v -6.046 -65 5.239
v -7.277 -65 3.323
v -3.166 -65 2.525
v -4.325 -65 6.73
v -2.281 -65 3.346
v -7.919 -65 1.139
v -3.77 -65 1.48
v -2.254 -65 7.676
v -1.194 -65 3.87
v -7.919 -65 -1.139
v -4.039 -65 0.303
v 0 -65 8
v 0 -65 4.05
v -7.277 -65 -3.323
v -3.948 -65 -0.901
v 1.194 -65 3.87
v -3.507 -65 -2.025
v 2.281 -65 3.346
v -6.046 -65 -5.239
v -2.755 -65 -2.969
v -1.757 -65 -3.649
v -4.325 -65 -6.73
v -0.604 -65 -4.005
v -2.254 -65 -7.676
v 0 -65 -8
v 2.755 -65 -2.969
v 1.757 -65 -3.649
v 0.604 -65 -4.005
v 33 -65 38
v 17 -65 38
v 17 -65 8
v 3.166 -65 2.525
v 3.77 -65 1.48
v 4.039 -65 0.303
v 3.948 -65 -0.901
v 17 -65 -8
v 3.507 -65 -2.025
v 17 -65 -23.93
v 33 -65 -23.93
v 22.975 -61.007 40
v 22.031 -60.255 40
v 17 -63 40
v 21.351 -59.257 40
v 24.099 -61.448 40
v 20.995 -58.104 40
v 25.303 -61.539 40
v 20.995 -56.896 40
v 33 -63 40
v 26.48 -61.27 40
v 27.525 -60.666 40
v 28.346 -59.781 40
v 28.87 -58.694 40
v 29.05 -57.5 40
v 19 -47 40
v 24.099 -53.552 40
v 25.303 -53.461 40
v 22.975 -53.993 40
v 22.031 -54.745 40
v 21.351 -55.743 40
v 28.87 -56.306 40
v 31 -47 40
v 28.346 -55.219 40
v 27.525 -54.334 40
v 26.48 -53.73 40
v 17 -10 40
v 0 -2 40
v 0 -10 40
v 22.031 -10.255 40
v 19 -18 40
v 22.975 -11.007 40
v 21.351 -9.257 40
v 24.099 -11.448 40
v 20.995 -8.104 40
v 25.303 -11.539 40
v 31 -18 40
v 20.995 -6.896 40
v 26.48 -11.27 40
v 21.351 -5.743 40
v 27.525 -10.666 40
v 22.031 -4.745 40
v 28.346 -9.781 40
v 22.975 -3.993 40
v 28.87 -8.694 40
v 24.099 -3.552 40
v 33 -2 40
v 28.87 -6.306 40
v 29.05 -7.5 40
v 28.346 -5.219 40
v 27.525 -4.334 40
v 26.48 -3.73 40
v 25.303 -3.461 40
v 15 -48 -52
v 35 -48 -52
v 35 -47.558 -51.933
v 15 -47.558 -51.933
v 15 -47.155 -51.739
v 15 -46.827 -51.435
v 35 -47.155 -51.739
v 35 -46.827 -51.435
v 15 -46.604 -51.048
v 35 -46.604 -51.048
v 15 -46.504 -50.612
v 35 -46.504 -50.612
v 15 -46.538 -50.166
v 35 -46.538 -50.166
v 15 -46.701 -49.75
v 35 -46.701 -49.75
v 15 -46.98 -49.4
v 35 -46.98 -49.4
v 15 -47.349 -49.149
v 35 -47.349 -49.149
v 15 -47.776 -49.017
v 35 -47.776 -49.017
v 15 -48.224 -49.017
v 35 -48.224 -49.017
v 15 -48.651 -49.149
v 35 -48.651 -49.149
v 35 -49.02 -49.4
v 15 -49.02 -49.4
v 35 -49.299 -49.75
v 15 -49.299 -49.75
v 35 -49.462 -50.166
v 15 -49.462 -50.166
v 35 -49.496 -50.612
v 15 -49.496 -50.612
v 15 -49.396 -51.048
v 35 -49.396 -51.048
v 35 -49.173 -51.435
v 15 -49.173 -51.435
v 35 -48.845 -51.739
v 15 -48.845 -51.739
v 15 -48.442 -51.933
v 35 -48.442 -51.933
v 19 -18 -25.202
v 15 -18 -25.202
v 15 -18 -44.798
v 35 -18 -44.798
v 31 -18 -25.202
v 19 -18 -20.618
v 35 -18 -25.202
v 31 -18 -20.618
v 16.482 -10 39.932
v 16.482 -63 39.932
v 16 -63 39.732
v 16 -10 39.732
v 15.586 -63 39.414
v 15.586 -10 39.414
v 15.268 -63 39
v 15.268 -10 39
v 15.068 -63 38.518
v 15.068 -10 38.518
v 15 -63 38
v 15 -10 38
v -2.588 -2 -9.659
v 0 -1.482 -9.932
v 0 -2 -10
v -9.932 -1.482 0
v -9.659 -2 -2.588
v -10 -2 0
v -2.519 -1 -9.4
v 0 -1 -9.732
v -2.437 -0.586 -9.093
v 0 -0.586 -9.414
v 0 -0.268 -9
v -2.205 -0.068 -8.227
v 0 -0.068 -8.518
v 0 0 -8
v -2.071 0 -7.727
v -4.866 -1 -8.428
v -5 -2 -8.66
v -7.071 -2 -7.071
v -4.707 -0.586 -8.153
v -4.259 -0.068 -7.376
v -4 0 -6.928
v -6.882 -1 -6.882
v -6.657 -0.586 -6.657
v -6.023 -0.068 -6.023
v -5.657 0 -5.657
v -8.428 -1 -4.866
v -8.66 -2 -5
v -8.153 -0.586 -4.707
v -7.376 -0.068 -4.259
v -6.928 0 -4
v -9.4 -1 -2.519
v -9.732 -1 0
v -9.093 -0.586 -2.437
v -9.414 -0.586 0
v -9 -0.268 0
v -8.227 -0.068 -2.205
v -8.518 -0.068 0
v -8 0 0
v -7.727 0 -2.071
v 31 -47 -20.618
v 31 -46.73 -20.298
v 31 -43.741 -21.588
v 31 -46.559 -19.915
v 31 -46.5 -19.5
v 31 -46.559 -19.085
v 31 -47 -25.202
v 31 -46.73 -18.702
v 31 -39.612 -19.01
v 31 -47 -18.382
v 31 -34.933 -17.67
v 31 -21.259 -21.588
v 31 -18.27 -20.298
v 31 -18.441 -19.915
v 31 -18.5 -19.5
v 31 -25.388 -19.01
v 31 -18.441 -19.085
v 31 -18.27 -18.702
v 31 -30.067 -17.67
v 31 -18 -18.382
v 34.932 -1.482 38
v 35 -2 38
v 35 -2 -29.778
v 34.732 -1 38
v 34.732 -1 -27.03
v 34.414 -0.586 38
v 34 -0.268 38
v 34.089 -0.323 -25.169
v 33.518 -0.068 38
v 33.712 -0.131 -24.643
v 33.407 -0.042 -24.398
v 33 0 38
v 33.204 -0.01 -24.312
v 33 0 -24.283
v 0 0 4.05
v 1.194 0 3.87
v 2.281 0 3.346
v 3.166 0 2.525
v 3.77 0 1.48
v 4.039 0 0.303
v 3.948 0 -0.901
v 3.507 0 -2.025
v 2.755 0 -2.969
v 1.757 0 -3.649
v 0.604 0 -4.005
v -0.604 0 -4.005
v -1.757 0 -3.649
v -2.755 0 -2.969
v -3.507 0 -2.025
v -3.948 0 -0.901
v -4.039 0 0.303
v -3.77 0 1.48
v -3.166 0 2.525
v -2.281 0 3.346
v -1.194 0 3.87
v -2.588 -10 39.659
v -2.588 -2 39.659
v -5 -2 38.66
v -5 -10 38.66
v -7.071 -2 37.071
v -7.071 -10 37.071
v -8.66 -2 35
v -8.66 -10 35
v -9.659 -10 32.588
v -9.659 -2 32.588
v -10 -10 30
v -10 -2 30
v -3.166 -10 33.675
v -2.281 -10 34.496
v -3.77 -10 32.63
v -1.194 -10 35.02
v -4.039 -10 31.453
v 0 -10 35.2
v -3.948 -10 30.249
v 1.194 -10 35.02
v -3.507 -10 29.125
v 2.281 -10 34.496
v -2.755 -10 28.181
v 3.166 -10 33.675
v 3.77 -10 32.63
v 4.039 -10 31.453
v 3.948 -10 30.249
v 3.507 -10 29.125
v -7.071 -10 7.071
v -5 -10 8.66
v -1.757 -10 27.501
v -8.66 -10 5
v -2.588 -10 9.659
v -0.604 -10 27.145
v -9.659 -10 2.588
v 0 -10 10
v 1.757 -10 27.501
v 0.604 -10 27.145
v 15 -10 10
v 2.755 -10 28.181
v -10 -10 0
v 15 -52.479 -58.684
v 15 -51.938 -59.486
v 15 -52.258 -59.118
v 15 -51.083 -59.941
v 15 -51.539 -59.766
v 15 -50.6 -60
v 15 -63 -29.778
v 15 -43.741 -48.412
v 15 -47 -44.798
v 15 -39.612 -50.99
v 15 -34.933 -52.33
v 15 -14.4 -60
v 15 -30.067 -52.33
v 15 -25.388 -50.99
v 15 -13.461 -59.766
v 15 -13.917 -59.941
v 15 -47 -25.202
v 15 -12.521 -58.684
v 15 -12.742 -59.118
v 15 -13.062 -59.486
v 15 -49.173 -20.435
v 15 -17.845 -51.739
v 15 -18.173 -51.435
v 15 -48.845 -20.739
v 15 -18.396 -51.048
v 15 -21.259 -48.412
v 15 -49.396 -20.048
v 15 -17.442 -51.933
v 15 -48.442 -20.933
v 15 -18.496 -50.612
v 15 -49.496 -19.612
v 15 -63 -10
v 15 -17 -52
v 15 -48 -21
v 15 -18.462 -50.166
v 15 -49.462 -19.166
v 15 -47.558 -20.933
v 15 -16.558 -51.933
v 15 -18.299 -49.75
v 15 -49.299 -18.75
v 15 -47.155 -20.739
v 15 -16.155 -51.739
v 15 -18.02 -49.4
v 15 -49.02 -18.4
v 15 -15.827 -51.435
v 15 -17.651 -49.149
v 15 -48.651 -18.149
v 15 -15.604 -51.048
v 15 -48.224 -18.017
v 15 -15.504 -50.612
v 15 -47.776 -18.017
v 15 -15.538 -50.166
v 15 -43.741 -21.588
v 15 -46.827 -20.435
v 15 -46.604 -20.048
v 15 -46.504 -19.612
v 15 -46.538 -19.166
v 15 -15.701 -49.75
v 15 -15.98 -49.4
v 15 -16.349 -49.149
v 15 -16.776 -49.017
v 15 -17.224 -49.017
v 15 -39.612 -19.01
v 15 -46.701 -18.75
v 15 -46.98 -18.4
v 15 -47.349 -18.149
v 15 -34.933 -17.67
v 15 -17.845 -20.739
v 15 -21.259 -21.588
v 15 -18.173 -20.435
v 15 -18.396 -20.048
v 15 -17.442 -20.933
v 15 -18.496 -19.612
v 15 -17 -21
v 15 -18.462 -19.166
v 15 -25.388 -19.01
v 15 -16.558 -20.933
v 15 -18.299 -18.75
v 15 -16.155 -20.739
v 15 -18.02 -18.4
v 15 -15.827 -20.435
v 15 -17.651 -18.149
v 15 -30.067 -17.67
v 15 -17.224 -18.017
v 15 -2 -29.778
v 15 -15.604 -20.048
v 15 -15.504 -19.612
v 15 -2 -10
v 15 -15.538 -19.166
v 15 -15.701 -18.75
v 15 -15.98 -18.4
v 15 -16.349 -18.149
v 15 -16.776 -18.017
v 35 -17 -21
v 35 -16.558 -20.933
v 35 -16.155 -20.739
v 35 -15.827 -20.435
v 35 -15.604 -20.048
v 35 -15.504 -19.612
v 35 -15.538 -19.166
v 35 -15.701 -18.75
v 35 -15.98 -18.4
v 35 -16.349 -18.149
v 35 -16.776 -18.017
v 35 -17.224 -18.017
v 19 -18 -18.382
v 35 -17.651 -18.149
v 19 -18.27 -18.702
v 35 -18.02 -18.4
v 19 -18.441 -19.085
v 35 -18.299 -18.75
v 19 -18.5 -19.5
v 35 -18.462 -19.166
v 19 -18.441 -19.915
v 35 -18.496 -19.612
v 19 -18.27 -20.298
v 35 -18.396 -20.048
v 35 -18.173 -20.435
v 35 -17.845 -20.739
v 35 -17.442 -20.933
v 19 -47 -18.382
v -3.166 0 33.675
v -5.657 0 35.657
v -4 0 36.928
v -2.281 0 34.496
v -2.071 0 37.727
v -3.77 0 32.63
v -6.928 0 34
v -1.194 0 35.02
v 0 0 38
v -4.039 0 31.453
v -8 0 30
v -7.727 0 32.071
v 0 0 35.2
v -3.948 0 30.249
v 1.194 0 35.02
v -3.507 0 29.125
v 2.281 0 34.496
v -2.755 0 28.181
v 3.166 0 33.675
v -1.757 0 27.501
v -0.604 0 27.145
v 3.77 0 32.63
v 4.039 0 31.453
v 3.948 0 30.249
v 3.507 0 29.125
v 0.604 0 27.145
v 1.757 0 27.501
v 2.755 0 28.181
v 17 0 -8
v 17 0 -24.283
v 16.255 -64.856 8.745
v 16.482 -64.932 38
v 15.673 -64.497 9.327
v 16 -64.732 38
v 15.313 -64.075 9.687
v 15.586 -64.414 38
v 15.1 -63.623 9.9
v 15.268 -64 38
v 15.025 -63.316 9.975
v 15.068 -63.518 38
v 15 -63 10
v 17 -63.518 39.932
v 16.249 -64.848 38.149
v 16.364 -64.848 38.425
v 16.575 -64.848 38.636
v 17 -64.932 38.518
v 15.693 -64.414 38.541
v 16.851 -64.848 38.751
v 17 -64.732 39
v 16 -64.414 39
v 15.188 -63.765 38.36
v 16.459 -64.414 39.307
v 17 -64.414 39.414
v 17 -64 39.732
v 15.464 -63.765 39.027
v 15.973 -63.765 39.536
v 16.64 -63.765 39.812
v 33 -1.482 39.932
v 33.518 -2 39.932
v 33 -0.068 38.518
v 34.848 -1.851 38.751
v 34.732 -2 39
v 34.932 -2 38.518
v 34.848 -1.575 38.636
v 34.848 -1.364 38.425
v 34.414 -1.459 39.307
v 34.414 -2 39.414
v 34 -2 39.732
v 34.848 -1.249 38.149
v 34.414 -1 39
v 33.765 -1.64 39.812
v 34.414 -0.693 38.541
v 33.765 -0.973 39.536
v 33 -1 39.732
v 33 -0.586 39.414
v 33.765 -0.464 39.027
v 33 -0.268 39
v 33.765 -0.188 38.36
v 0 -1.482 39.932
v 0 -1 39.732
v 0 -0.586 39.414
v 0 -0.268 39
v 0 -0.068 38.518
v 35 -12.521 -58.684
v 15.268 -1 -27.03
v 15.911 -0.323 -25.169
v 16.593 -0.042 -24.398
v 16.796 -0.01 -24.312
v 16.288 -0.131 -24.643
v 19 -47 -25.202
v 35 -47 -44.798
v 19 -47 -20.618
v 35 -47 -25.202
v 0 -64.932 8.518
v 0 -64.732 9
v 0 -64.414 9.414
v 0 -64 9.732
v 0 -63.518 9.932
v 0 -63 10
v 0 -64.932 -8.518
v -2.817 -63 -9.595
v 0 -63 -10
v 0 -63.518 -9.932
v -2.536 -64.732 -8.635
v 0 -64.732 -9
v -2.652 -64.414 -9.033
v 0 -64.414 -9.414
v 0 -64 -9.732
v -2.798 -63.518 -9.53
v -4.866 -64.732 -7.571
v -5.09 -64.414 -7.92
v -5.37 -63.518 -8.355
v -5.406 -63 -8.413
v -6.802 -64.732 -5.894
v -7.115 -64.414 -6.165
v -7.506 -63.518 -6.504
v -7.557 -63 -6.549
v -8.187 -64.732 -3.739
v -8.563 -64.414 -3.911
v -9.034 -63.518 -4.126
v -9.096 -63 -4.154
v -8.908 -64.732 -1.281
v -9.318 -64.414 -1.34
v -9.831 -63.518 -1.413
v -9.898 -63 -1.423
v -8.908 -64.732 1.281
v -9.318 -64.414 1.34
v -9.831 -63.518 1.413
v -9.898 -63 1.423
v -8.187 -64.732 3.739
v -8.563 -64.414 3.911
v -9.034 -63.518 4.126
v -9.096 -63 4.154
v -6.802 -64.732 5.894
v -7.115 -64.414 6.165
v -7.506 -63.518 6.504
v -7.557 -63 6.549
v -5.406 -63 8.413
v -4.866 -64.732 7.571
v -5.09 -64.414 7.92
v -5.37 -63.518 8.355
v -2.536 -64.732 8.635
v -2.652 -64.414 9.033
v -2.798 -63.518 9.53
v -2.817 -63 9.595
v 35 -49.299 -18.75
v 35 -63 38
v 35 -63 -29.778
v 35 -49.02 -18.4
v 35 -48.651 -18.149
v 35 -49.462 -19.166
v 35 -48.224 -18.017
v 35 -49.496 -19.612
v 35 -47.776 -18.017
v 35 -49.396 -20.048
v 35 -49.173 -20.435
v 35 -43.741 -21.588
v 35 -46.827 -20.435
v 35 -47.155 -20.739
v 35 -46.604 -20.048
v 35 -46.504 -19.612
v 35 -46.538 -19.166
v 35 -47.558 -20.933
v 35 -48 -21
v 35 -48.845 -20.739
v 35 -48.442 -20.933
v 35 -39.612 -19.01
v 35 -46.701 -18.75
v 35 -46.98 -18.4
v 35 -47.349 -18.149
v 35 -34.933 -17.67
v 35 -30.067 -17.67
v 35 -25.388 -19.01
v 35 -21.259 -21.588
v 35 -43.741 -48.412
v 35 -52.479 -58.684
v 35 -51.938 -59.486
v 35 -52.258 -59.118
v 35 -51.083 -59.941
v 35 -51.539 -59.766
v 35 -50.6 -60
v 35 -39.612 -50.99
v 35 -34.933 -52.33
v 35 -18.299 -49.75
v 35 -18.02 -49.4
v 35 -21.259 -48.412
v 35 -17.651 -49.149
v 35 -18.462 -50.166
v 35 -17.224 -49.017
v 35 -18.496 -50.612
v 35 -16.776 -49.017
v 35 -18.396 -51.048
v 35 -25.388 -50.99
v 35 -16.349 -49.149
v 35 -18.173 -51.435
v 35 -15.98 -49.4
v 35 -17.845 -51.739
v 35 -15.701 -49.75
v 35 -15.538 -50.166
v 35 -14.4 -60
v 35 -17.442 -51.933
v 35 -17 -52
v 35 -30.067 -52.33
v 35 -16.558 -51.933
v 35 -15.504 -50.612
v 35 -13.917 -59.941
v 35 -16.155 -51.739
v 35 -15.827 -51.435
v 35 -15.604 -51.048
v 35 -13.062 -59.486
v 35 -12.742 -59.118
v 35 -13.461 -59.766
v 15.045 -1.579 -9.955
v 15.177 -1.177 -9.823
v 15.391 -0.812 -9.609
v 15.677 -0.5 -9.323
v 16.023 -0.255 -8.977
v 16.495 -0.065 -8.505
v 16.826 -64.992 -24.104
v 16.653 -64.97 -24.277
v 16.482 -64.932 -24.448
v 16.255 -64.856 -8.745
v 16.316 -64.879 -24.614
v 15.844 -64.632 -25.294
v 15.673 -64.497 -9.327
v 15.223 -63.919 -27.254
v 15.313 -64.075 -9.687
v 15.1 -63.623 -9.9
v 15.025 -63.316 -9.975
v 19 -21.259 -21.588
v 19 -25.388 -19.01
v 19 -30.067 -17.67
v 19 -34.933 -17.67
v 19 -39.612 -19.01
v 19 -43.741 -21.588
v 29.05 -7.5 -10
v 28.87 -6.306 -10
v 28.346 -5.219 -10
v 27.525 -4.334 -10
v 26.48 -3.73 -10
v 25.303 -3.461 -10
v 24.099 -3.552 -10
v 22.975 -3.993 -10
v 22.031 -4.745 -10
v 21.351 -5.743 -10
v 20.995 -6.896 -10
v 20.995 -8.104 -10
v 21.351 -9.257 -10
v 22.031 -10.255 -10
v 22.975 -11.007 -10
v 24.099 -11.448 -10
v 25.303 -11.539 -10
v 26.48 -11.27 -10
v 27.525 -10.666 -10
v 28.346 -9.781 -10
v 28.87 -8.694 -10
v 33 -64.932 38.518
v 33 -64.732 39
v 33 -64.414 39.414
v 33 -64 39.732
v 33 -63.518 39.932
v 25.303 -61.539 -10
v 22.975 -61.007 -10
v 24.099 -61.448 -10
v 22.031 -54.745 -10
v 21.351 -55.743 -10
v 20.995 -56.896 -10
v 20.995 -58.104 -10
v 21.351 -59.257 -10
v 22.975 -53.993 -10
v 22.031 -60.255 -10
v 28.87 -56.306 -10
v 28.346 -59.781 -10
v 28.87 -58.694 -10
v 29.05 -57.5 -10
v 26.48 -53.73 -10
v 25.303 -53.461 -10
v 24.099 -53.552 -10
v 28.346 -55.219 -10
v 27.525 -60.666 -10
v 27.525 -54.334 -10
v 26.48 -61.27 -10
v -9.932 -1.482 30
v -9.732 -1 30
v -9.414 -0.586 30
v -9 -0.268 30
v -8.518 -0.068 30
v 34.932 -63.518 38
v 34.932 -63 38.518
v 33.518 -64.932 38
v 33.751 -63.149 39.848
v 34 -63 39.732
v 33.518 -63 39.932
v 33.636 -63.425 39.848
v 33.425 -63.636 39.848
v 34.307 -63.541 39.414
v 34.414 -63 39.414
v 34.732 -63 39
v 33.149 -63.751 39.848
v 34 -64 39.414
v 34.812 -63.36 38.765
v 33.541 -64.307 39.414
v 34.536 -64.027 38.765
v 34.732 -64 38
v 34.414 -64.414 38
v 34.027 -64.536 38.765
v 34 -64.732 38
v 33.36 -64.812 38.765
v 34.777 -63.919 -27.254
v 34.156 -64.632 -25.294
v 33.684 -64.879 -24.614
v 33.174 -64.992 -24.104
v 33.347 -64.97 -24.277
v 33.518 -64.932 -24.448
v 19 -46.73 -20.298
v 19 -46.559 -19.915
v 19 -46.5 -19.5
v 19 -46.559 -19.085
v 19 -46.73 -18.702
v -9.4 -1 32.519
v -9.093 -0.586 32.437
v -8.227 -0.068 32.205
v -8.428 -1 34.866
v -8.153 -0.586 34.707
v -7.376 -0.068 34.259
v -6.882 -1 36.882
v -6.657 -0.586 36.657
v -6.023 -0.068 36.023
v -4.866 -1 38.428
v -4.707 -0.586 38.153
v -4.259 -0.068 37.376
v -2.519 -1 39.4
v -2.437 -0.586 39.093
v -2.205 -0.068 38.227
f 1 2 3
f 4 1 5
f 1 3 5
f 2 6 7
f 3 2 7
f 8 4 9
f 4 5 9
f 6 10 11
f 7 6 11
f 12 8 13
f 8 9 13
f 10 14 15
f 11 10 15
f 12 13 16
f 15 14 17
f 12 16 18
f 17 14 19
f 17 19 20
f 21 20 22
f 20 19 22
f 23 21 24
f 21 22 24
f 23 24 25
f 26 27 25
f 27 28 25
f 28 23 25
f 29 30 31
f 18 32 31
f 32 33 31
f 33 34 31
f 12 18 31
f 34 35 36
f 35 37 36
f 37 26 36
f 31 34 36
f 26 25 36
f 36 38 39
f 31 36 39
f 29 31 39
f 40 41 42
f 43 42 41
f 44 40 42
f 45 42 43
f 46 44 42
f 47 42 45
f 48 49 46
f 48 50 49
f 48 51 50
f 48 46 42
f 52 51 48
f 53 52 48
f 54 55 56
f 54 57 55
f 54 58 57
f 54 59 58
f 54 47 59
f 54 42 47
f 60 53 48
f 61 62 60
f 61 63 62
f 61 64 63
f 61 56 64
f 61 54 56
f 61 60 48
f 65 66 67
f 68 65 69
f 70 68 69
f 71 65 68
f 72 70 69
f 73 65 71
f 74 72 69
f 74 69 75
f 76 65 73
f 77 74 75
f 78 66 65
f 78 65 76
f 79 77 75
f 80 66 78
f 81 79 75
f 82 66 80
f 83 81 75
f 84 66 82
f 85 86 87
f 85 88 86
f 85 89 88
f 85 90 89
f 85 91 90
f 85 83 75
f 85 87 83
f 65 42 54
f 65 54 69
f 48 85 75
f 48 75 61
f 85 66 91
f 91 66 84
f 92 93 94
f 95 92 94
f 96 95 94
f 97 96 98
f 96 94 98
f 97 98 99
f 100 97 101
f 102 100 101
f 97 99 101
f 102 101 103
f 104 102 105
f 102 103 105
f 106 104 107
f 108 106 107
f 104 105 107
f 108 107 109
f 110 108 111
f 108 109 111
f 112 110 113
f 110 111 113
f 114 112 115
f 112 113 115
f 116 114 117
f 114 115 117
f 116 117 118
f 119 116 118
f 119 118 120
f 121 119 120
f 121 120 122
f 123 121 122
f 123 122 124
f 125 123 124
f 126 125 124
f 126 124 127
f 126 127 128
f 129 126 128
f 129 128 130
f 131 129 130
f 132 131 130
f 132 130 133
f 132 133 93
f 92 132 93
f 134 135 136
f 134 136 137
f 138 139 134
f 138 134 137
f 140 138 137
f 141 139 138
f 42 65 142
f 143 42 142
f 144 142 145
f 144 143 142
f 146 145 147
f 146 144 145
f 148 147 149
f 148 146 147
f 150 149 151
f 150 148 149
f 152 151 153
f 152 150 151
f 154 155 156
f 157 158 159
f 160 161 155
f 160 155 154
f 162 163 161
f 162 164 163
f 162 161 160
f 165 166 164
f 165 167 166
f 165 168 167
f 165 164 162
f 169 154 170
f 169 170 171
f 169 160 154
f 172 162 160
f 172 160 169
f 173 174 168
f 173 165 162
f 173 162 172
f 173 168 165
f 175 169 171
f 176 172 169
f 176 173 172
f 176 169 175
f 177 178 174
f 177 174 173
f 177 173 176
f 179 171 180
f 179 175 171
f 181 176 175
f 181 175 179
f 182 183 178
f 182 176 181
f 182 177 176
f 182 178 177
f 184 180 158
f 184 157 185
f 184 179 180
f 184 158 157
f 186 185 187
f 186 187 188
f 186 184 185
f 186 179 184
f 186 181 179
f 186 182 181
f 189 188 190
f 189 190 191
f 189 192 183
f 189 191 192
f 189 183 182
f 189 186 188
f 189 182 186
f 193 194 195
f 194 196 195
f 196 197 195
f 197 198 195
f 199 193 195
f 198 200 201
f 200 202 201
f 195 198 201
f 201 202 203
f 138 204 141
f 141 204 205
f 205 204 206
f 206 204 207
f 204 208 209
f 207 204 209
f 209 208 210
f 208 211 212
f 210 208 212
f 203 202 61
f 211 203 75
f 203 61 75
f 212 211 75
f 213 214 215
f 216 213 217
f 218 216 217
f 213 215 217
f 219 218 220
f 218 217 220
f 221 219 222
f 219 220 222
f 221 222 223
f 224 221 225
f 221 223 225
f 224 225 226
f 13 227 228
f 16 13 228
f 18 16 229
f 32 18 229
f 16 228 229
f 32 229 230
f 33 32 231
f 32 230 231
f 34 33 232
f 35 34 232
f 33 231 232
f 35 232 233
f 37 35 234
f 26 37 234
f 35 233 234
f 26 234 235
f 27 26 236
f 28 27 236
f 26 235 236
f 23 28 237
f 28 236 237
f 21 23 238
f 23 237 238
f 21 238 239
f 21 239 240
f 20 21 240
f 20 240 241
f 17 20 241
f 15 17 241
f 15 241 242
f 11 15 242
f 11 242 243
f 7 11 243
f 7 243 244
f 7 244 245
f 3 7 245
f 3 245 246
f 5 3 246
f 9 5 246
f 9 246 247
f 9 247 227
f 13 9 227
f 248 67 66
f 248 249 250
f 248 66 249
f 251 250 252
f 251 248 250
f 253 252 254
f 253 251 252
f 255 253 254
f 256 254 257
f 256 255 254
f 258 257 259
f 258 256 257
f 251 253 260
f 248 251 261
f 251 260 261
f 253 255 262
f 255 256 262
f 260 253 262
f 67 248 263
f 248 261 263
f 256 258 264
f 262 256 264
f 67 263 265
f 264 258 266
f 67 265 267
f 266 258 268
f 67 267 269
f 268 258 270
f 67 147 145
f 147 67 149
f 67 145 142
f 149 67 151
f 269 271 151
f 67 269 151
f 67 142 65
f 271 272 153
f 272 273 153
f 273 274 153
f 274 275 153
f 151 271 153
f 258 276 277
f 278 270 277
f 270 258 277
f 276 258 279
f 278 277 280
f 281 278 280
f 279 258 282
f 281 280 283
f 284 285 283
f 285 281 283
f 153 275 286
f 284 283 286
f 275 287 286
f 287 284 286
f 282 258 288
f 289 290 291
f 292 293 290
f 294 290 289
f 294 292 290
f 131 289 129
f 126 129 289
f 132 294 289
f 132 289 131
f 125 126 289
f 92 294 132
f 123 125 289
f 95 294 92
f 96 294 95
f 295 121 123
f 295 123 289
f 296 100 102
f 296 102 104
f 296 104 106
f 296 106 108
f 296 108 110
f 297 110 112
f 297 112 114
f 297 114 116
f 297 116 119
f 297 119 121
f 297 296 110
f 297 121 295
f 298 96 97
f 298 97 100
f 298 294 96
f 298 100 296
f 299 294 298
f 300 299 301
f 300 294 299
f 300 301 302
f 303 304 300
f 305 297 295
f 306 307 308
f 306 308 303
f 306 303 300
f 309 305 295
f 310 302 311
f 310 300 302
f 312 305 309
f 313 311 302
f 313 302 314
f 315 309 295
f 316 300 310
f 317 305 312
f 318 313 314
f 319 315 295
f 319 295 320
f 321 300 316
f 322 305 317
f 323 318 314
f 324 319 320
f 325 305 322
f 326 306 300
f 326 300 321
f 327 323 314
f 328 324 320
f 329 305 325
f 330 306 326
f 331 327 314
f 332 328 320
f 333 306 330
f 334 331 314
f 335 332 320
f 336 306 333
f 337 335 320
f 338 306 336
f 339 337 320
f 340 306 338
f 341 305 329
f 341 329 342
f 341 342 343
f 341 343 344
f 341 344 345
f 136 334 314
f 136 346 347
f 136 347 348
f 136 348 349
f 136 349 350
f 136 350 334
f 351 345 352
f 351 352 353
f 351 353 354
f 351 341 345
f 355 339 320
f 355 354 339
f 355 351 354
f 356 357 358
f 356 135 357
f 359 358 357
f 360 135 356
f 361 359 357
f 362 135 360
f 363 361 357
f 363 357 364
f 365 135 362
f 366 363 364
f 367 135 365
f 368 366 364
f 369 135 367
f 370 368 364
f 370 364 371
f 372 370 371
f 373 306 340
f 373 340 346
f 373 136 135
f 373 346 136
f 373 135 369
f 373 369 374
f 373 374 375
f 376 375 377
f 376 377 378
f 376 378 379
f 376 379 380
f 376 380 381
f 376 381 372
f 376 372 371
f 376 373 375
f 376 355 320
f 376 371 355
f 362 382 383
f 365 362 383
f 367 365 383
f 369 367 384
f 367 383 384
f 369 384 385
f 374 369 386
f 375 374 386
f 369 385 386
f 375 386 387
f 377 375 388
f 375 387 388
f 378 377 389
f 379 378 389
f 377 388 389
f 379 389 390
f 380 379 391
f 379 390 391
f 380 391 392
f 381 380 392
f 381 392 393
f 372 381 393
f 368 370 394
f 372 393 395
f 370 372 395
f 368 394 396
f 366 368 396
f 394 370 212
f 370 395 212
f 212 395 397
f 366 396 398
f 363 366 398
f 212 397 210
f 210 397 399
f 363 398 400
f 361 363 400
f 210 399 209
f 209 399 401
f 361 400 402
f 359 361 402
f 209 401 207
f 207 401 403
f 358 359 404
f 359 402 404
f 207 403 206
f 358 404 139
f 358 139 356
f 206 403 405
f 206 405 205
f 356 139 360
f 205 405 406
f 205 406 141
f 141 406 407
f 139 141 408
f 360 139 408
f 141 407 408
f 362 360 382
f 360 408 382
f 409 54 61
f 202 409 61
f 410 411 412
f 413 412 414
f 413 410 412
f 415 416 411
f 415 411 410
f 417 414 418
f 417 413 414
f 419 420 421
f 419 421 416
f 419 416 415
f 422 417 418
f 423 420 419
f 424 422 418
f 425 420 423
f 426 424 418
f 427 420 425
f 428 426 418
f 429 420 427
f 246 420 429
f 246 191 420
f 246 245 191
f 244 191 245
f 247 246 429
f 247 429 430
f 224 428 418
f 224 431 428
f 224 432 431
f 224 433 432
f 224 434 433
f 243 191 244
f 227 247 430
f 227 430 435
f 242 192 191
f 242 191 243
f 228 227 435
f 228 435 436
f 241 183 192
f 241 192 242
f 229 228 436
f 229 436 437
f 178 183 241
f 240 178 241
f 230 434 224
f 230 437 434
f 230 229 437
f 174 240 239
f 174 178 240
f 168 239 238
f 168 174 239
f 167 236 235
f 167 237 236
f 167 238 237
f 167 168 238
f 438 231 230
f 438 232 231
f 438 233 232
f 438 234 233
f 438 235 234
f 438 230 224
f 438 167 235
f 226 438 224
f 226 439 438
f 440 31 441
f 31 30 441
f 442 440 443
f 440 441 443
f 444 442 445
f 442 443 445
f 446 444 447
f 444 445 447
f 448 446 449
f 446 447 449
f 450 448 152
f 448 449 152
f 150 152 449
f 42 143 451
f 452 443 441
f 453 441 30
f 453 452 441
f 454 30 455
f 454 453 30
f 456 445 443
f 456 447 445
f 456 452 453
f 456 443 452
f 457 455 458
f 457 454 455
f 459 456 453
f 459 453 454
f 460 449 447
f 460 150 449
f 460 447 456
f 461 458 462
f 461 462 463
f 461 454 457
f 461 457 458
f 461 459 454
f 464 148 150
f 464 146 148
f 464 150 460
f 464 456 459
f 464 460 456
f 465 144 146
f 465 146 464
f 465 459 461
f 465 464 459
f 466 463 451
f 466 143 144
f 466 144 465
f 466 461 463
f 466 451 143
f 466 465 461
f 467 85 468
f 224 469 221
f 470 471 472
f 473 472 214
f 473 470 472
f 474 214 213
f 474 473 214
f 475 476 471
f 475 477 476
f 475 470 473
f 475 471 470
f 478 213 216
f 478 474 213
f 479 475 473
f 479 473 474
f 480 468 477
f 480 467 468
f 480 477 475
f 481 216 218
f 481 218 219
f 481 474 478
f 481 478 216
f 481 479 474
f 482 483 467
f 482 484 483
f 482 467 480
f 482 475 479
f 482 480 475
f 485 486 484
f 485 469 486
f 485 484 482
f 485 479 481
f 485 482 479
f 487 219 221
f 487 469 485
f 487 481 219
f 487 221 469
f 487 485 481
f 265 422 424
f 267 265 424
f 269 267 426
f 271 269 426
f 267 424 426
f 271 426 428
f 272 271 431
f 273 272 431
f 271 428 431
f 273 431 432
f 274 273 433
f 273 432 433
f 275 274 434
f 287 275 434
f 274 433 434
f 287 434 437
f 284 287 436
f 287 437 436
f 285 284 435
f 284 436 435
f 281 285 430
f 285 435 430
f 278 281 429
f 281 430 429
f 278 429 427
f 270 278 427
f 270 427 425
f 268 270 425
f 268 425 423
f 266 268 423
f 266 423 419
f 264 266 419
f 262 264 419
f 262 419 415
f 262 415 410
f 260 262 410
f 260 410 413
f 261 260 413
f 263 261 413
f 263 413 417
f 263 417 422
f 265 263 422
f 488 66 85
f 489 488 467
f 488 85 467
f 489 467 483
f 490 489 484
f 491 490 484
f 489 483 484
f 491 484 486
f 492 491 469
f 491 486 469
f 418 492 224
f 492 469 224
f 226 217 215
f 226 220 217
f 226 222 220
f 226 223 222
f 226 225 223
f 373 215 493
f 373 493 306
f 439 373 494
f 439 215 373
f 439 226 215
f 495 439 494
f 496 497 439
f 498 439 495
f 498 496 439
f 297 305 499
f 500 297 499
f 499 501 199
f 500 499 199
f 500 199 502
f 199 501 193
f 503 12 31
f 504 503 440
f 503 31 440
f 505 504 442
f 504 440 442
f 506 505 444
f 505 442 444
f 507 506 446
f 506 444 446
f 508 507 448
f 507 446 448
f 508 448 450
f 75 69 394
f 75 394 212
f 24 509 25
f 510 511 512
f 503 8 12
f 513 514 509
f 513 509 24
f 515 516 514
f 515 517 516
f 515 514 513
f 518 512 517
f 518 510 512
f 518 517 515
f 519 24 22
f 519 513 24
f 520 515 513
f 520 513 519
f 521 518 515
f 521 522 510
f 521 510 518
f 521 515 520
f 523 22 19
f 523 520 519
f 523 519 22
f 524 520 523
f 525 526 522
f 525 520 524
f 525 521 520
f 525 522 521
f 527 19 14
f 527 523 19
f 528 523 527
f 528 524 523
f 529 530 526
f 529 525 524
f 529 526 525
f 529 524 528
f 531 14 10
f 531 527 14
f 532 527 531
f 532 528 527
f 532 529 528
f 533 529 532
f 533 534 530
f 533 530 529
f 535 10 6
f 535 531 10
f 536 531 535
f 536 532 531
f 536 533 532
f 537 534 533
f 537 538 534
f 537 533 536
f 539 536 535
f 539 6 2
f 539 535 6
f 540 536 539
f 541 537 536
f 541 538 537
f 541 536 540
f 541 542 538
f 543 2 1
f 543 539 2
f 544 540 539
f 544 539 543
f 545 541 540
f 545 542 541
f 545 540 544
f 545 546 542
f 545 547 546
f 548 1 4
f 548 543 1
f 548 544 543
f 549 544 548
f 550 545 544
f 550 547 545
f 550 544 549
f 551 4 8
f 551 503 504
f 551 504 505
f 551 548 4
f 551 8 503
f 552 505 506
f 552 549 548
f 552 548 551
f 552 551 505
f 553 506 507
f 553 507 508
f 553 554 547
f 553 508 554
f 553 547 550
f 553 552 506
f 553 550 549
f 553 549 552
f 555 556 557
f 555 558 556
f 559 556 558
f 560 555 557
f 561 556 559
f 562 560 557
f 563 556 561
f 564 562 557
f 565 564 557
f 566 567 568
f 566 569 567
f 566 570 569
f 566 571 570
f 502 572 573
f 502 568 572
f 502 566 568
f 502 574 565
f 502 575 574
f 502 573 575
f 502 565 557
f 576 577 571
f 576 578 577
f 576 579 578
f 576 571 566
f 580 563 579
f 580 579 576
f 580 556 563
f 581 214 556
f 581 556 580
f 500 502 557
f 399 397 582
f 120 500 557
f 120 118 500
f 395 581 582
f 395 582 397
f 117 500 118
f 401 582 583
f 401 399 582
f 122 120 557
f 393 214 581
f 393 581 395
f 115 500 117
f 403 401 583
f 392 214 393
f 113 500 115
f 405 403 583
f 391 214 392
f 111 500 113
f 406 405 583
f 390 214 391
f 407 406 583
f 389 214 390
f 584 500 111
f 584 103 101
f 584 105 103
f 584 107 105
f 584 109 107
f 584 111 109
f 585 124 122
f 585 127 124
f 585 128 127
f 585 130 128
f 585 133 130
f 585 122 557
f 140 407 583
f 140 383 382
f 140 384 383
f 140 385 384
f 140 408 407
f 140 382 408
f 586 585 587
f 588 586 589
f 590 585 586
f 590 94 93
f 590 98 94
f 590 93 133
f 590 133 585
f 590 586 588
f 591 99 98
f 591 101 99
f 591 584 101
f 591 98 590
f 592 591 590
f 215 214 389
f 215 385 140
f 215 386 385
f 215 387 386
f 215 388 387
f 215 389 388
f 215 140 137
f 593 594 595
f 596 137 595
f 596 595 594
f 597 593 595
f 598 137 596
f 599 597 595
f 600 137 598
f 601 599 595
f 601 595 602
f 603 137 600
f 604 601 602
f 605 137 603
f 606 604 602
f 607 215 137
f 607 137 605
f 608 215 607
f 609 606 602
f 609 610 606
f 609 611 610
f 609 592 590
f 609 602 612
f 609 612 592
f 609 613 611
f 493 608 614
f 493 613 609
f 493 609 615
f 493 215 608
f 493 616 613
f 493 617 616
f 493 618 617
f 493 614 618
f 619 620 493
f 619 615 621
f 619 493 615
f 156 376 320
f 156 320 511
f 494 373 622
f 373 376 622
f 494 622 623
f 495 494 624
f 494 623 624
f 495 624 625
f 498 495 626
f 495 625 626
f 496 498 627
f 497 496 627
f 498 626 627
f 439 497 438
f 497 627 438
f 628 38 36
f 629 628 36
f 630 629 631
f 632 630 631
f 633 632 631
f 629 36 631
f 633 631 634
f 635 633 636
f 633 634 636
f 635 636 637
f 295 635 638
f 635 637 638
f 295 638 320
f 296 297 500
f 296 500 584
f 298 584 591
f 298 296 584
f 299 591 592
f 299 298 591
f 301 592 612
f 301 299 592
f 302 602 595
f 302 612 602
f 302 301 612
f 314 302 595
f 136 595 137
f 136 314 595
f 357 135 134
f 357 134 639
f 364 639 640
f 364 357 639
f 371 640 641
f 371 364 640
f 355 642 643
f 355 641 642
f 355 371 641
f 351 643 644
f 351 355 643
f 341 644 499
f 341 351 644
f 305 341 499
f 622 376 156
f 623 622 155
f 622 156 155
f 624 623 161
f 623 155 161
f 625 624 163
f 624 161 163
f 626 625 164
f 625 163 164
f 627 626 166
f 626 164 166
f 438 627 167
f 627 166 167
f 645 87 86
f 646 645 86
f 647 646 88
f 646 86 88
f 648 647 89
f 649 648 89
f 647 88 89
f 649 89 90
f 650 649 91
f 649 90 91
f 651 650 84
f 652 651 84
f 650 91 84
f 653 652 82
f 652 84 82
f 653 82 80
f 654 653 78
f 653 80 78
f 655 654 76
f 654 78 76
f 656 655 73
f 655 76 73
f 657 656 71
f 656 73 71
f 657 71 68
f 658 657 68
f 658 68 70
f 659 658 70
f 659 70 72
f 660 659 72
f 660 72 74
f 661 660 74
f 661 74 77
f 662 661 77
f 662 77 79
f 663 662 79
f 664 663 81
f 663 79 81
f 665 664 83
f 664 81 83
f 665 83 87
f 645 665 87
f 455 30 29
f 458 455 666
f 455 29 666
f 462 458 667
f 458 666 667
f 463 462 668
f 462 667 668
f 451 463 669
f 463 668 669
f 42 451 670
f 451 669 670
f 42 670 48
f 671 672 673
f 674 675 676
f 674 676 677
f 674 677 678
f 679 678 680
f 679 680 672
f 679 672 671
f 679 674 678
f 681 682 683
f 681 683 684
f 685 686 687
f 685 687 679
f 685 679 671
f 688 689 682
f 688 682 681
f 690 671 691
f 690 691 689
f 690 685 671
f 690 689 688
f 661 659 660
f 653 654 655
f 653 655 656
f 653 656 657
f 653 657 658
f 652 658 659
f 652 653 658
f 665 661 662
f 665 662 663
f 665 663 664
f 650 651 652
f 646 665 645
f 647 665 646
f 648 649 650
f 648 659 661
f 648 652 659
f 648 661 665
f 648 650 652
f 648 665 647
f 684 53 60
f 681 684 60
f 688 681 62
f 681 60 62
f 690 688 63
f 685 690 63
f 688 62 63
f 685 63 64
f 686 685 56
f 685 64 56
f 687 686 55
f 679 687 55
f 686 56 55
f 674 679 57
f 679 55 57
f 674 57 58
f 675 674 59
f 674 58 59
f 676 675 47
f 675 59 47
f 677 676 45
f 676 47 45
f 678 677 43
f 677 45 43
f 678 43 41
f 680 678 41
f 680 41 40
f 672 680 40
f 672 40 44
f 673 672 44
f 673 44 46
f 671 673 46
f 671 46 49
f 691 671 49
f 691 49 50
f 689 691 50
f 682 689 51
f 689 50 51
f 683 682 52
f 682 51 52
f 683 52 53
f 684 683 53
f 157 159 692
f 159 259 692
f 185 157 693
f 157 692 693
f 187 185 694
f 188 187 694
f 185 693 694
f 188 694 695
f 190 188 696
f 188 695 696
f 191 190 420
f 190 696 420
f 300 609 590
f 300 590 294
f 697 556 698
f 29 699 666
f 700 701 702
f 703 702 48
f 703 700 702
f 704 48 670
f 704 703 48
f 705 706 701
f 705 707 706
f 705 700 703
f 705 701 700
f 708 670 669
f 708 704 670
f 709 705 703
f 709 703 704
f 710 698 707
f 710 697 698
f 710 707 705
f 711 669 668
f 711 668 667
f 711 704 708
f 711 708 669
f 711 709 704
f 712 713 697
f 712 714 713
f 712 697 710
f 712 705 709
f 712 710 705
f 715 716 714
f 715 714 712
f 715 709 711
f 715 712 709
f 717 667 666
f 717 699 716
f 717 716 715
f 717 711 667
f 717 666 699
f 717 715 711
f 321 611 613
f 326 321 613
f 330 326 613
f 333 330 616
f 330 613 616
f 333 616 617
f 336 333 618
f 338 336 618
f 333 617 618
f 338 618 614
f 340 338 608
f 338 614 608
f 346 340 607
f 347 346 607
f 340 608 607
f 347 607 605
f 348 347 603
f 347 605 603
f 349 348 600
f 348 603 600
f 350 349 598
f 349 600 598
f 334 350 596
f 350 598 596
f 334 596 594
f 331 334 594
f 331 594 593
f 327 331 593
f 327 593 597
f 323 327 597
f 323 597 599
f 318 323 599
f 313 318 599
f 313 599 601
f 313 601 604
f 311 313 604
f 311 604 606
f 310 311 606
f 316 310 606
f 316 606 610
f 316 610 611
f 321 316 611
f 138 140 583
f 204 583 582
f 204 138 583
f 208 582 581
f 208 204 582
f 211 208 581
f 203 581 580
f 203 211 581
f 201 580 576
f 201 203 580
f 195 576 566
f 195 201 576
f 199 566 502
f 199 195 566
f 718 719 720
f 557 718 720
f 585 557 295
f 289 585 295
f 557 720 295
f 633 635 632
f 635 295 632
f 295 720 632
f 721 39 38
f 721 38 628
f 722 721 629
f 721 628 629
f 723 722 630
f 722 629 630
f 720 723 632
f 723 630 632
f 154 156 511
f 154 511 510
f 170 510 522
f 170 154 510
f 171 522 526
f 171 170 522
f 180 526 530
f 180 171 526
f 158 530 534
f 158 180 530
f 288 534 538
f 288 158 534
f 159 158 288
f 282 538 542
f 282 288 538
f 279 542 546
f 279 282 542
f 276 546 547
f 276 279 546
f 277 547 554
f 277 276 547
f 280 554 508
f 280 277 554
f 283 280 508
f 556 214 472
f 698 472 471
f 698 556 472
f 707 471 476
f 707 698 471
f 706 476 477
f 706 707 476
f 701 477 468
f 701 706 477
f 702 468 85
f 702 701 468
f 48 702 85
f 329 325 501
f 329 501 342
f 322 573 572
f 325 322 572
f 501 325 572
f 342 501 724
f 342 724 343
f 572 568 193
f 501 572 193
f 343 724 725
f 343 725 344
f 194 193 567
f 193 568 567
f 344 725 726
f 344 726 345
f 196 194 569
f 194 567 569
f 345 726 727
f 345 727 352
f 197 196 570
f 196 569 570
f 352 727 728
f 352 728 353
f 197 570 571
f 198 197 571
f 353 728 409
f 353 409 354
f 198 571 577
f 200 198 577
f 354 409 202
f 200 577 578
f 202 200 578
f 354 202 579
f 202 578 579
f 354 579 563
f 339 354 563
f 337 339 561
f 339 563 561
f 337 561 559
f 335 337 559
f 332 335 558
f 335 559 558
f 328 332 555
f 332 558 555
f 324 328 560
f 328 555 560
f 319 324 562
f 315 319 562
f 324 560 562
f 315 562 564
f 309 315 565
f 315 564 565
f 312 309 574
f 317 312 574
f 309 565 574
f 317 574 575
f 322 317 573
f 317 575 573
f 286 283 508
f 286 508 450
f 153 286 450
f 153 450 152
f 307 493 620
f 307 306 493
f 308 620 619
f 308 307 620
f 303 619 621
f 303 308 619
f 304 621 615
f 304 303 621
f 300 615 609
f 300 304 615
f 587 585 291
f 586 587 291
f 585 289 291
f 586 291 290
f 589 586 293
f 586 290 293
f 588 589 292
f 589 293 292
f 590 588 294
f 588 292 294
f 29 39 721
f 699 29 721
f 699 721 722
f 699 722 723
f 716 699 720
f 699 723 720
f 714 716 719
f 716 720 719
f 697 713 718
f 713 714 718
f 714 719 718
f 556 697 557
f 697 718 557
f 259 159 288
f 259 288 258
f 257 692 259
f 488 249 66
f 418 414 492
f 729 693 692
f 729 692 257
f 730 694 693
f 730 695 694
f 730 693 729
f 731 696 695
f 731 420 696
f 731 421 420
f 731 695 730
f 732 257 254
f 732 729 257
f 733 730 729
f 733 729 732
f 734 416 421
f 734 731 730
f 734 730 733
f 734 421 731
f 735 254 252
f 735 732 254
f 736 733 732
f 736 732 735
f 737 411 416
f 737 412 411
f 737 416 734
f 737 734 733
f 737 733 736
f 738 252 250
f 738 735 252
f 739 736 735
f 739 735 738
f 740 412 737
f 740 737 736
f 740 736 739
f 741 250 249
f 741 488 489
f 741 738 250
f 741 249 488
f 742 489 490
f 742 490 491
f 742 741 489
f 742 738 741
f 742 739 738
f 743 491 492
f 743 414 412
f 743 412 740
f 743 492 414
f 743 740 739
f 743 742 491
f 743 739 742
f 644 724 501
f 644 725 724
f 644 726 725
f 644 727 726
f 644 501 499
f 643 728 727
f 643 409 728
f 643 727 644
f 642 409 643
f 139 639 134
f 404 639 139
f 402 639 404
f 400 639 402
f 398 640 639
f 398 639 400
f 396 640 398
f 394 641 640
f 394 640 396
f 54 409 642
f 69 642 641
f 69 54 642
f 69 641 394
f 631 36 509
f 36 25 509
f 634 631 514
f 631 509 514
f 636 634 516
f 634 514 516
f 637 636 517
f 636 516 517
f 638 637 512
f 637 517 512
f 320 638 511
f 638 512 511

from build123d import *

# Parameters (mm, degrees)
SKETCH2_R               = 10
BOSS_EXTRUDE1_DEPTH     = 65
BOSS_EXTRUDE2_DEPTH     = 10
BOSS_EXTRUDE3_DEPTH     = 65
FILLET1_R               = 10
SKETCH5_R               = 4.05
CUT_EXTRUDE1_DEPTH      = 78.781745931
BOSS_EXTRUDE4_DEPTH     = 65
SKETCH8_R               = 4.05
CUT_EXTRUDE3_DEPTH      = 50
CUT_EXTRUDE5_DEPTH      = 92.923881554
CUT_EXTRUDE6_REACH      = 126.298
CUT_EXTRUDE6_END_RADIUS = 17.5
SKETCH7_W               = 12
SKETCH7_H               = 29
CHAMFER1_SIZE           = 13
CHAMFER1_SIZE2          = 35.717206453
FILLET2_R               = 2
SKETCH14_R              = 1.5
CUT_EXTRUDE7_DEPTH      = 100.247166206


with BuildPart() as part:
    # Sketch2 → Boss-Extrude1 (new body)
    with BuildSketch(Plane(origin=(0, 0, 0), x_dir=(1, 0, 0), z_dir=(0, 1, 0))):
        with Locations(Location((0, 0, 0), (0, 0, 270))):
            Circle(SKETCH2_R)
    extrude(amount=-BOSS_EXTRUDE1_DEPTH)

    # Sketch3 → Boss-Extrude2 (add)
    with BuildSketch(Plane(origin=(0, 0, 0), x_dir=(1, 0, 0), z_dir=(0, 1, 0))):
        with BuildLine():
            Line((-10, 0), (-10, -40))
            Line((-10, -40), (15, -40))
            Line((15, -40), (15, 10))
            Line((15, 10), (0, 10))
            ThreePointArc((0, 10), (-7.071067812, 7.071067812), (-10, 0))
        make_face()
    extrude(amount=-BOSS_EXTRUDE2_DEPTH)

    # Sketch4 → Boss-Extrude3 (add)
    with BuildSketch(Plane(origin=(0, 0, 0), x_dir=(1, 0, 0), z_dir=(0, 1, 0))):
        with BuildLine():
            Line((15, 10), (0, 10))
            ThreePointArc((0, 10), (10, 0), (0, -10))
            Line((0, -10), (15, -10))
            Line((15, -10), (15, 10))
        make_face()
    extrude(amount=-BOSS_EXTRUDE3_DEPTH)

    # Fillet1
    fillet1_edges = [part.edges().sort_by_distance(p)[0] for p in [
        (-10, -5, 40),
    ]]
    fillet(fillet1_edges, radius=FILLET1_R)

    # Sketch5 → Cut-Extrude1 (cut, through all)
    with BuildSketch(Plane(origin=(0, 0, 0), x_dir=(1, 0, 0), z_dir=(0, 1, 0))):
        with Locations(Location((0, -31.15, 0), (0, 0, 270))):
            Circle(SKETCH5_R)
        with Locations(Location((0, 0, 0), (0, 0, 270))):
            Circle(SKETCH5_R)
    extrude(amount=-CUT_EXTRUDE1_DEPTH, mode=Mode.SUBTRACT)

    # Sketch6 → Boss-Extrude4 (add)
    with BuildSketch(Plane(origin=(0, 0, 0), x_dir=(1, 0, 0), z_dir=(0, 1, 0))):
        Polygon((15, -40), (35, -40), (35, 60), (15, 60), (15, 10), align=None)
    extrude(amount=-BOSS_EXTRUDE4_DEPTH)

    # Sketch8 → Cut-Extrude3 (cut)
    with BuildSketch(Plane.XY.offset(40)):
        with Locations((25, -7.5)):
            Circle(SKETCH8_R)
        with Locations((25, -57.5)):
            Circle(SKETCH8_R)
    extrude(amount=-CUT_EXTRUDE3_DEPTH, mode=Mode.SUBTRACT)

    # Sketch13 → Cut-Extrude5 (cut, through all)
    with BuildSketch(Plane.ZY.offset(-15)):
        with BuildLine():
            Line((-44.797958971, -18), (-25.202041029, -18))
            ThreePointArc((-25.202041029, -18), (-17.5, -32.5), (-25.202041029, -47))
            Line((-25.202041029, -47), (-44.797958971, -47))
            ThreePointArc((-44.797958971, -47), (-52.5, -32.5), (-44.797958971, -18))
        make_face()
    extrude(amount=-CUT_EXTRUDE5_DEPTH, mode=Mode.SUBTRACT)

    # Cut-Extrude6: up to this cylinder (the profile starts outside it)
    cut_extrude6_end = Plane(origin=(25, -32.5, -35), z_dir=(-1, 0, 0)) * Cylinder(CUT_EXTRUDE6_END_RADIUS, 288.596, mode=Mode.PRIVATE)
    # Sketch7 → Cut-Extrude6 (cut, up to the surface)
    with BuildSketch(Plane.XY.offset(40), mode=Mode.PRIVATE) as cut_extrude6_sk1:
        with Locations((25, -32.5)):
            Rectangle(SKETCH7_W, SKETCH7_H)
    cut_extrude6_tool1 = extrude(cut_extrude6_sk1.sketch, amount=-CUT_EXTRUDE6_REACH, mode=Mode.PRIVATE) - cut_extrude6_end
    add(cut_extrude6_tool1.solids().sort_by_distance((25, -32.5, 40))[0], mode=Mode.SUBTRACT)

    # Chamfer1
    chamfer1_edges = [part.edges().sort_by_distance(p)[0] for p in [
        (25, 0, -60),
        (25, -65, -60),
    ]]
    chamfer1_side = [part.faces().sort_by_distance(p)[0] for p in [
        (25, -32.5, -60),
    ]]
    chamfer(chamfer1_edges, length=CHAMFER1_SIZE, length2=CHAMFER1_SIZE2, reference=chamfer1_side[0])

    # Fillet2
    fillet2_edges = [part.edges().sort_by_distance(p)[0] for p in [
        (7.5, 0, -10),
        (-10, 0, 15),
        (35, -65, 7.858603226),
        (25, -65, -24.282793547),
        (25, -13, -60),
        (25, -52, -60),
        (15, 0, -17.141396774),
        (-7.071067812, 0, -7.071067812),
        (-10, -65, 0),
        (7.5, -65, -10),
        (7.5, -65, 10),
        (17.5, 0, 40),
        (-7.071067812, 0, 37.071067812),
        (15, -37.5, 40),
        (35, -32.5, 40),
        (35, 0, 7.858603226),
        (15, -65, 25),
        (15, -65, -17.141396774),
        (25, -65, 40),
    ]]
    fillet(fillet2_edges, radius=FILLET2_R)

    # Sketch14 → Cut-Extrude7 (cut, through all)
    with BuildSketch(Plane(origin=(35, 0, 0), x_dir=(0, 0, -1), z_dir=(1, 0, 0))):
        with Locations((19.5, -17)):
            Circle(SKETCH14_R)
        with Locations((50.5, -17)):
            Circle(SKETCH14_R)
        with Locations((50.5, -48)):
            Circle(SKETCH14_R)
        with Locations((19.5, -48)):
            Circle(SKETCH14_R)
    extrude(amount=-CUT_EXTRUDE7_DEPTH, mode=Mode.SUBTRACT)


solid = part.part
